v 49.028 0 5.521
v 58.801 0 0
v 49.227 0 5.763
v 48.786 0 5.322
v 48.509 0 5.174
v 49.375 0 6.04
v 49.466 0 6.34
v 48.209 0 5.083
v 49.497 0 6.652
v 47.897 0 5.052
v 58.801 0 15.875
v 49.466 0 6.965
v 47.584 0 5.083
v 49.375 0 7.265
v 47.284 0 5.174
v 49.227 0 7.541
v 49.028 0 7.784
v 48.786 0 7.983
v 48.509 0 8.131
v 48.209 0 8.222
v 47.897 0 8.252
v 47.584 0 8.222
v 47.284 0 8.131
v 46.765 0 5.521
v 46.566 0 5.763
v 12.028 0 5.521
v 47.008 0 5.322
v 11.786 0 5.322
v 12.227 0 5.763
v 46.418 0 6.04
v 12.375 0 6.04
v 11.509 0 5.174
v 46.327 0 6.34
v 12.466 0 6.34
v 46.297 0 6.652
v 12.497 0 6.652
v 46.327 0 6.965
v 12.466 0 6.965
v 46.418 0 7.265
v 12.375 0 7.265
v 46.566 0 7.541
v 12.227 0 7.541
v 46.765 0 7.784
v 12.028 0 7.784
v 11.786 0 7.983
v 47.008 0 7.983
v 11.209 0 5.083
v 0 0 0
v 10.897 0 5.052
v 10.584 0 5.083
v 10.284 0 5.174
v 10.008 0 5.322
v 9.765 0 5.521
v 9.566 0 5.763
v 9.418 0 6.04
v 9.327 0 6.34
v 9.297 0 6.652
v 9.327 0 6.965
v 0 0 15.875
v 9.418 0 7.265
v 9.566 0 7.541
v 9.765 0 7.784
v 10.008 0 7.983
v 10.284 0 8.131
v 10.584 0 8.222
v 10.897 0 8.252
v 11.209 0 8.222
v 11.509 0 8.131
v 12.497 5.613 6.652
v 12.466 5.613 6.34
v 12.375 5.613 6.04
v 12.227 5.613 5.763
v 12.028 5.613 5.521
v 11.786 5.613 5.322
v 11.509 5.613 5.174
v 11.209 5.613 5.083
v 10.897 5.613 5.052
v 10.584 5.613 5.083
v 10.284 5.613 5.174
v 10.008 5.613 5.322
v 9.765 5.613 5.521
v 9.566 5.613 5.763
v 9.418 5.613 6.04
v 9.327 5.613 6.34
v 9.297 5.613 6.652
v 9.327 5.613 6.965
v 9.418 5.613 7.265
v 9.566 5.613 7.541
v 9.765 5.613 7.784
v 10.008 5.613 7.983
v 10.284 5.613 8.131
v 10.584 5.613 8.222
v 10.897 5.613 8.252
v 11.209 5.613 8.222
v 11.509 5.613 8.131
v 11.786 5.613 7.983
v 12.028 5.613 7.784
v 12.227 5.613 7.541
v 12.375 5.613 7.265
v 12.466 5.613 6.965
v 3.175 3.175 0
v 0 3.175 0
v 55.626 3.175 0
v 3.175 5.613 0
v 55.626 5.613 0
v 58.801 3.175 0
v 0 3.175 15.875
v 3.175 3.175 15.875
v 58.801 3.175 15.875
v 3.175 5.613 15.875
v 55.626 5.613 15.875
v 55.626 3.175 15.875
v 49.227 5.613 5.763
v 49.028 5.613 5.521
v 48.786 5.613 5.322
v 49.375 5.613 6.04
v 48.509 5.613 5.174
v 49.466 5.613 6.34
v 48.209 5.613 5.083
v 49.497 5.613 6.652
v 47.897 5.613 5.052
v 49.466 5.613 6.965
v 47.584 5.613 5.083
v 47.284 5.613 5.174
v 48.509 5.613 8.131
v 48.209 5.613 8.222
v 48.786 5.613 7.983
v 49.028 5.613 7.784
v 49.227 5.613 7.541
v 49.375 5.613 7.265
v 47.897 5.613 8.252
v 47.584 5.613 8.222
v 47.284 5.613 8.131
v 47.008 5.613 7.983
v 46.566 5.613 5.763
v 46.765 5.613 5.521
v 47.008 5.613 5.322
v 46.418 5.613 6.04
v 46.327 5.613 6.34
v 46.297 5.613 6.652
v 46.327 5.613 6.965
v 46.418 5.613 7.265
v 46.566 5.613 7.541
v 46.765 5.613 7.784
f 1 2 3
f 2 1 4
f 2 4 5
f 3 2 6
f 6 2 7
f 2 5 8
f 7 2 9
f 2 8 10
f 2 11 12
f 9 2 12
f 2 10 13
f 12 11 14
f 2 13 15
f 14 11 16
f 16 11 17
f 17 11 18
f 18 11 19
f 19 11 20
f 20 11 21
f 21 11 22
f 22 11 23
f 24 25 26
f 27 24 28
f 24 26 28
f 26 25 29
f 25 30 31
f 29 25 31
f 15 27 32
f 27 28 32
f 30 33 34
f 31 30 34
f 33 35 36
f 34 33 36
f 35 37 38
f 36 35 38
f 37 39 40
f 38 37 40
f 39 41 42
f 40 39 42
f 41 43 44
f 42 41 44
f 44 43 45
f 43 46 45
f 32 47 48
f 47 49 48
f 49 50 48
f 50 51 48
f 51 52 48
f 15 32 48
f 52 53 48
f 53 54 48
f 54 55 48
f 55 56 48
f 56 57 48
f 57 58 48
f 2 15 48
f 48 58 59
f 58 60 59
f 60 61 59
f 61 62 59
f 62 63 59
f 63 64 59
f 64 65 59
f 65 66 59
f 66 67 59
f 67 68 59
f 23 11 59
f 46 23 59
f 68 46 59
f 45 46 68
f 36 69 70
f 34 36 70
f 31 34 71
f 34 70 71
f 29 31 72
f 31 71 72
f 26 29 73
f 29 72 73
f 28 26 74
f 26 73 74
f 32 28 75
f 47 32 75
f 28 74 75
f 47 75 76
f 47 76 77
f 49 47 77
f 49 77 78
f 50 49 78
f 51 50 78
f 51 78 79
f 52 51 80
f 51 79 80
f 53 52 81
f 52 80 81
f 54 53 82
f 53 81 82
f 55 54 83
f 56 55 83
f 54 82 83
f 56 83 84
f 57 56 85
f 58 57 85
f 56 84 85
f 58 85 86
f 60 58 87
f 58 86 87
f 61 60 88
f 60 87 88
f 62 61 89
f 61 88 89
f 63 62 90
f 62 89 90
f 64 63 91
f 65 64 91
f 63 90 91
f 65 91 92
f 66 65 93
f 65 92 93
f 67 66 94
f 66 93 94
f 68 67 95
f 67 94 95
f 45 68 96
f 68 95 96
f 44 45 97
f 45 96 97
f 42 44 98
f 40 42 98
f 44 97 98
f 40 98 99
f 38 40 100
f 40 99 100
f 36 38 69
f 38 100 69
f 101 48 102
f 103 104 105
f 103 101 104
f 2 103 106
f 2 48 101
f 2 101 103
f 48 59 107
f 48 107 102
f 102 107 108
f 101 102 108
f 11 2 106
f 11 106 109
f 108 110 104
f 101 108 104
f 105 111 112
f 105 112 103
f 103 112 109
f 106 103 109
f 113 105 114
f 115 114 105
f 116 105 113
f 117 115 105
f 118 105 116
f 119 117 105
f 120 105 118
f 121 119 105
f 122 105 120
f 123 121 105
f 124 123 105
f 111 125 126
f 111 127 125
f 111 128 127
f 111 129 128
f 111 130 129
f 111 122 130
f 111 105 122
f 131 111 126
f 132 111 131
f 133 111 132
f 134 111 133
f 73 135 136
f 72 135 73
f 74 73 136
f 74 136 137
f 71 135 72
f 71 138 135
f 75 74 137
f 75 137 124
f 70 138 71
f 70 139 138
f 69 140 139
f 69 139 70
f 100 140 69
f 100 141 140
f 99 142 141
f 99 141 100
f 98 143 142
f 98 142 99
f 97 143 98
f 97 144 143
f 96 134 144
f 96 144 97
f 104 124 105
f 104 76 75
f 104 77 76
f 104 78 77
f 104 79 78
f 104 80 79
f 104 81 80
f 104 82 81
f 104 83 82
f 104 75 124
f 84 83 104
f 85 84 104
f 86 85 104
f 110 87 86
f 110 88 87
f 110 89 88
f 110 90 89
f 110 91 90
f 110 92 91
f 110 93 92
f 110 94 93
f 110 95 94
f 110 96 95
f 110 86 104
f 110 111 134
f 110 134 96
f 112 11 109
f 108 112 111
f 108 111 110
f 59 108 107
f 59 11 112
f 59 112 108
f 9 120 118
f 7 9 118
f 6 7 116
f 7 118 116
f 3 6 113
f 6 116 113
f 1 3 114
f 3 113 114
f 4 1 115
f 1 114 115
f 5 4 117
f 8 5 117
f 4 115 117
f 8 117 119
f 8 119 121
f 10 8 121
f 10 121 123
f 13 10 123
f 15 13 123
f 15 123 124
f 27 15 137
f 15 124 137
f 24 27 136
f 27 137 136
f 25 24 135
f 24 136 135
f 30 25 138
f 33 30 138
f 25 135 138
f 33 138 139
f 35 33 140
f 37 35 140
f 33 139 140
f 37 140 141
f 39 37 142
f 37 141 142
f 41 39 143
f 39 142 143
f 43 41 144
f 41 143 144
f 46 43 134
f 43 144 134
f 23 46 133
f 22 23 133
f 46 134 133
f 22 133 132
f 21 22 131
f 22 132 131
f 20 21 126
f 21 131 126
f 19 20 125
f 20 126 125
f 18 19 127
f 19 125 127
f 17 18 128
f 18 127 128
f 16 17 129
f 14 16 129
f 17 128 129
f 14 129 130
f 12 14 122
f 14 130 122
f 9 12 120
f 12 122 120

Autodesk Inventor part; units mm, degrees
ref_plane "YZ Plane" through (0, 0, 0) normal (1, 0, 0) x (0, 1, 0)
ref_plane "XZ Plane" through (0, 0, 0) normal (0, 1, 0) x (-1, 0, 0)
ref_plane "XY Plane" through (0, 0, 0) normal (0, 0, 1) x (1, 0, 0)
sketch "Sketch1" plane through (0, 0, 0) normal (0, 1, 0) x (-1, 0, 0)
  line L0 (0, 0) -> (-58.801, 0)
  line L1 (-58.801, 0) -> (-58.801, 15.875)
  line L2 (-58.801, 15.875) -> (0, 15.875)
  line L3 (0, 15.875) -> (0, 0)
  dimension "d0" = 58.801
  dimension "d1" = 15.875
extrude "Extrusion1" add sketch "Sketch1" along normal blind 5.6134
sketch "Sketch7" plane through (0, 5.6134, 0) normal (0, 1, 0) x (1, 0, 0)
  circle A0 centre (10.8966, -6.6524) radius 1.6
  circle A1 centre (47.8966, -6.6524) radius 1.6
  line L0 (0, 0) -> (0, -15.875) projected
  line L1 (58.801, 0) -> (0, 0) projected
  line L2 (58.801, -15.875) -> (58.801, 0) projected
  dimension "d22" = 3.2
  dimension "d23" = 3.2
  dimension "d24" = 37
  dimension "d43" = 6.6524
  dimension "d44" = 6.6524
  dimension "d48" = 10.8966
  dimension "d49" = 10.9044
extrude "Extrusion6" cut sketch "Sketch7" against normal blind 25.4
sketch "Sketch8" plane through (0, 5.6134, 0) normal (0, 1, 0) x (1, 0, 0)
  line L0 (58.801, 0) -> (0, 0) projected
  line L1 (0, 0) -> (0, -15.875) projected
  line L2 (58.801, -15.875) -> (58.801, 0) projected
  line L3 (0, -15.875) -> (3.175, -15.875)
  line L4 (3.175, -15.875) -> (3.175, 0)
  line L5 (3.175, 0) -> (0, 0)
  line L6 (0, 0) -> (0, -15.875)
  line L7 (58.801, -15.875) -> (55.626, -15.875)
  line L8 (55.626, -15.875) -> (55.626, 0)
  line L9 (55.626, 0) -> (58.801, 0)
  line L10 (58.801, 0) -> (58.801, -15.875)
  dimension "d34" = 3.175
  dimension "d35" = 3.175
extrude "Extrusion7" cut sketch "Sketch8" against normal blind 2.4384
equation "\"d23\" = d22"
properties part number "Lidar Sensor Case Piece 3"
